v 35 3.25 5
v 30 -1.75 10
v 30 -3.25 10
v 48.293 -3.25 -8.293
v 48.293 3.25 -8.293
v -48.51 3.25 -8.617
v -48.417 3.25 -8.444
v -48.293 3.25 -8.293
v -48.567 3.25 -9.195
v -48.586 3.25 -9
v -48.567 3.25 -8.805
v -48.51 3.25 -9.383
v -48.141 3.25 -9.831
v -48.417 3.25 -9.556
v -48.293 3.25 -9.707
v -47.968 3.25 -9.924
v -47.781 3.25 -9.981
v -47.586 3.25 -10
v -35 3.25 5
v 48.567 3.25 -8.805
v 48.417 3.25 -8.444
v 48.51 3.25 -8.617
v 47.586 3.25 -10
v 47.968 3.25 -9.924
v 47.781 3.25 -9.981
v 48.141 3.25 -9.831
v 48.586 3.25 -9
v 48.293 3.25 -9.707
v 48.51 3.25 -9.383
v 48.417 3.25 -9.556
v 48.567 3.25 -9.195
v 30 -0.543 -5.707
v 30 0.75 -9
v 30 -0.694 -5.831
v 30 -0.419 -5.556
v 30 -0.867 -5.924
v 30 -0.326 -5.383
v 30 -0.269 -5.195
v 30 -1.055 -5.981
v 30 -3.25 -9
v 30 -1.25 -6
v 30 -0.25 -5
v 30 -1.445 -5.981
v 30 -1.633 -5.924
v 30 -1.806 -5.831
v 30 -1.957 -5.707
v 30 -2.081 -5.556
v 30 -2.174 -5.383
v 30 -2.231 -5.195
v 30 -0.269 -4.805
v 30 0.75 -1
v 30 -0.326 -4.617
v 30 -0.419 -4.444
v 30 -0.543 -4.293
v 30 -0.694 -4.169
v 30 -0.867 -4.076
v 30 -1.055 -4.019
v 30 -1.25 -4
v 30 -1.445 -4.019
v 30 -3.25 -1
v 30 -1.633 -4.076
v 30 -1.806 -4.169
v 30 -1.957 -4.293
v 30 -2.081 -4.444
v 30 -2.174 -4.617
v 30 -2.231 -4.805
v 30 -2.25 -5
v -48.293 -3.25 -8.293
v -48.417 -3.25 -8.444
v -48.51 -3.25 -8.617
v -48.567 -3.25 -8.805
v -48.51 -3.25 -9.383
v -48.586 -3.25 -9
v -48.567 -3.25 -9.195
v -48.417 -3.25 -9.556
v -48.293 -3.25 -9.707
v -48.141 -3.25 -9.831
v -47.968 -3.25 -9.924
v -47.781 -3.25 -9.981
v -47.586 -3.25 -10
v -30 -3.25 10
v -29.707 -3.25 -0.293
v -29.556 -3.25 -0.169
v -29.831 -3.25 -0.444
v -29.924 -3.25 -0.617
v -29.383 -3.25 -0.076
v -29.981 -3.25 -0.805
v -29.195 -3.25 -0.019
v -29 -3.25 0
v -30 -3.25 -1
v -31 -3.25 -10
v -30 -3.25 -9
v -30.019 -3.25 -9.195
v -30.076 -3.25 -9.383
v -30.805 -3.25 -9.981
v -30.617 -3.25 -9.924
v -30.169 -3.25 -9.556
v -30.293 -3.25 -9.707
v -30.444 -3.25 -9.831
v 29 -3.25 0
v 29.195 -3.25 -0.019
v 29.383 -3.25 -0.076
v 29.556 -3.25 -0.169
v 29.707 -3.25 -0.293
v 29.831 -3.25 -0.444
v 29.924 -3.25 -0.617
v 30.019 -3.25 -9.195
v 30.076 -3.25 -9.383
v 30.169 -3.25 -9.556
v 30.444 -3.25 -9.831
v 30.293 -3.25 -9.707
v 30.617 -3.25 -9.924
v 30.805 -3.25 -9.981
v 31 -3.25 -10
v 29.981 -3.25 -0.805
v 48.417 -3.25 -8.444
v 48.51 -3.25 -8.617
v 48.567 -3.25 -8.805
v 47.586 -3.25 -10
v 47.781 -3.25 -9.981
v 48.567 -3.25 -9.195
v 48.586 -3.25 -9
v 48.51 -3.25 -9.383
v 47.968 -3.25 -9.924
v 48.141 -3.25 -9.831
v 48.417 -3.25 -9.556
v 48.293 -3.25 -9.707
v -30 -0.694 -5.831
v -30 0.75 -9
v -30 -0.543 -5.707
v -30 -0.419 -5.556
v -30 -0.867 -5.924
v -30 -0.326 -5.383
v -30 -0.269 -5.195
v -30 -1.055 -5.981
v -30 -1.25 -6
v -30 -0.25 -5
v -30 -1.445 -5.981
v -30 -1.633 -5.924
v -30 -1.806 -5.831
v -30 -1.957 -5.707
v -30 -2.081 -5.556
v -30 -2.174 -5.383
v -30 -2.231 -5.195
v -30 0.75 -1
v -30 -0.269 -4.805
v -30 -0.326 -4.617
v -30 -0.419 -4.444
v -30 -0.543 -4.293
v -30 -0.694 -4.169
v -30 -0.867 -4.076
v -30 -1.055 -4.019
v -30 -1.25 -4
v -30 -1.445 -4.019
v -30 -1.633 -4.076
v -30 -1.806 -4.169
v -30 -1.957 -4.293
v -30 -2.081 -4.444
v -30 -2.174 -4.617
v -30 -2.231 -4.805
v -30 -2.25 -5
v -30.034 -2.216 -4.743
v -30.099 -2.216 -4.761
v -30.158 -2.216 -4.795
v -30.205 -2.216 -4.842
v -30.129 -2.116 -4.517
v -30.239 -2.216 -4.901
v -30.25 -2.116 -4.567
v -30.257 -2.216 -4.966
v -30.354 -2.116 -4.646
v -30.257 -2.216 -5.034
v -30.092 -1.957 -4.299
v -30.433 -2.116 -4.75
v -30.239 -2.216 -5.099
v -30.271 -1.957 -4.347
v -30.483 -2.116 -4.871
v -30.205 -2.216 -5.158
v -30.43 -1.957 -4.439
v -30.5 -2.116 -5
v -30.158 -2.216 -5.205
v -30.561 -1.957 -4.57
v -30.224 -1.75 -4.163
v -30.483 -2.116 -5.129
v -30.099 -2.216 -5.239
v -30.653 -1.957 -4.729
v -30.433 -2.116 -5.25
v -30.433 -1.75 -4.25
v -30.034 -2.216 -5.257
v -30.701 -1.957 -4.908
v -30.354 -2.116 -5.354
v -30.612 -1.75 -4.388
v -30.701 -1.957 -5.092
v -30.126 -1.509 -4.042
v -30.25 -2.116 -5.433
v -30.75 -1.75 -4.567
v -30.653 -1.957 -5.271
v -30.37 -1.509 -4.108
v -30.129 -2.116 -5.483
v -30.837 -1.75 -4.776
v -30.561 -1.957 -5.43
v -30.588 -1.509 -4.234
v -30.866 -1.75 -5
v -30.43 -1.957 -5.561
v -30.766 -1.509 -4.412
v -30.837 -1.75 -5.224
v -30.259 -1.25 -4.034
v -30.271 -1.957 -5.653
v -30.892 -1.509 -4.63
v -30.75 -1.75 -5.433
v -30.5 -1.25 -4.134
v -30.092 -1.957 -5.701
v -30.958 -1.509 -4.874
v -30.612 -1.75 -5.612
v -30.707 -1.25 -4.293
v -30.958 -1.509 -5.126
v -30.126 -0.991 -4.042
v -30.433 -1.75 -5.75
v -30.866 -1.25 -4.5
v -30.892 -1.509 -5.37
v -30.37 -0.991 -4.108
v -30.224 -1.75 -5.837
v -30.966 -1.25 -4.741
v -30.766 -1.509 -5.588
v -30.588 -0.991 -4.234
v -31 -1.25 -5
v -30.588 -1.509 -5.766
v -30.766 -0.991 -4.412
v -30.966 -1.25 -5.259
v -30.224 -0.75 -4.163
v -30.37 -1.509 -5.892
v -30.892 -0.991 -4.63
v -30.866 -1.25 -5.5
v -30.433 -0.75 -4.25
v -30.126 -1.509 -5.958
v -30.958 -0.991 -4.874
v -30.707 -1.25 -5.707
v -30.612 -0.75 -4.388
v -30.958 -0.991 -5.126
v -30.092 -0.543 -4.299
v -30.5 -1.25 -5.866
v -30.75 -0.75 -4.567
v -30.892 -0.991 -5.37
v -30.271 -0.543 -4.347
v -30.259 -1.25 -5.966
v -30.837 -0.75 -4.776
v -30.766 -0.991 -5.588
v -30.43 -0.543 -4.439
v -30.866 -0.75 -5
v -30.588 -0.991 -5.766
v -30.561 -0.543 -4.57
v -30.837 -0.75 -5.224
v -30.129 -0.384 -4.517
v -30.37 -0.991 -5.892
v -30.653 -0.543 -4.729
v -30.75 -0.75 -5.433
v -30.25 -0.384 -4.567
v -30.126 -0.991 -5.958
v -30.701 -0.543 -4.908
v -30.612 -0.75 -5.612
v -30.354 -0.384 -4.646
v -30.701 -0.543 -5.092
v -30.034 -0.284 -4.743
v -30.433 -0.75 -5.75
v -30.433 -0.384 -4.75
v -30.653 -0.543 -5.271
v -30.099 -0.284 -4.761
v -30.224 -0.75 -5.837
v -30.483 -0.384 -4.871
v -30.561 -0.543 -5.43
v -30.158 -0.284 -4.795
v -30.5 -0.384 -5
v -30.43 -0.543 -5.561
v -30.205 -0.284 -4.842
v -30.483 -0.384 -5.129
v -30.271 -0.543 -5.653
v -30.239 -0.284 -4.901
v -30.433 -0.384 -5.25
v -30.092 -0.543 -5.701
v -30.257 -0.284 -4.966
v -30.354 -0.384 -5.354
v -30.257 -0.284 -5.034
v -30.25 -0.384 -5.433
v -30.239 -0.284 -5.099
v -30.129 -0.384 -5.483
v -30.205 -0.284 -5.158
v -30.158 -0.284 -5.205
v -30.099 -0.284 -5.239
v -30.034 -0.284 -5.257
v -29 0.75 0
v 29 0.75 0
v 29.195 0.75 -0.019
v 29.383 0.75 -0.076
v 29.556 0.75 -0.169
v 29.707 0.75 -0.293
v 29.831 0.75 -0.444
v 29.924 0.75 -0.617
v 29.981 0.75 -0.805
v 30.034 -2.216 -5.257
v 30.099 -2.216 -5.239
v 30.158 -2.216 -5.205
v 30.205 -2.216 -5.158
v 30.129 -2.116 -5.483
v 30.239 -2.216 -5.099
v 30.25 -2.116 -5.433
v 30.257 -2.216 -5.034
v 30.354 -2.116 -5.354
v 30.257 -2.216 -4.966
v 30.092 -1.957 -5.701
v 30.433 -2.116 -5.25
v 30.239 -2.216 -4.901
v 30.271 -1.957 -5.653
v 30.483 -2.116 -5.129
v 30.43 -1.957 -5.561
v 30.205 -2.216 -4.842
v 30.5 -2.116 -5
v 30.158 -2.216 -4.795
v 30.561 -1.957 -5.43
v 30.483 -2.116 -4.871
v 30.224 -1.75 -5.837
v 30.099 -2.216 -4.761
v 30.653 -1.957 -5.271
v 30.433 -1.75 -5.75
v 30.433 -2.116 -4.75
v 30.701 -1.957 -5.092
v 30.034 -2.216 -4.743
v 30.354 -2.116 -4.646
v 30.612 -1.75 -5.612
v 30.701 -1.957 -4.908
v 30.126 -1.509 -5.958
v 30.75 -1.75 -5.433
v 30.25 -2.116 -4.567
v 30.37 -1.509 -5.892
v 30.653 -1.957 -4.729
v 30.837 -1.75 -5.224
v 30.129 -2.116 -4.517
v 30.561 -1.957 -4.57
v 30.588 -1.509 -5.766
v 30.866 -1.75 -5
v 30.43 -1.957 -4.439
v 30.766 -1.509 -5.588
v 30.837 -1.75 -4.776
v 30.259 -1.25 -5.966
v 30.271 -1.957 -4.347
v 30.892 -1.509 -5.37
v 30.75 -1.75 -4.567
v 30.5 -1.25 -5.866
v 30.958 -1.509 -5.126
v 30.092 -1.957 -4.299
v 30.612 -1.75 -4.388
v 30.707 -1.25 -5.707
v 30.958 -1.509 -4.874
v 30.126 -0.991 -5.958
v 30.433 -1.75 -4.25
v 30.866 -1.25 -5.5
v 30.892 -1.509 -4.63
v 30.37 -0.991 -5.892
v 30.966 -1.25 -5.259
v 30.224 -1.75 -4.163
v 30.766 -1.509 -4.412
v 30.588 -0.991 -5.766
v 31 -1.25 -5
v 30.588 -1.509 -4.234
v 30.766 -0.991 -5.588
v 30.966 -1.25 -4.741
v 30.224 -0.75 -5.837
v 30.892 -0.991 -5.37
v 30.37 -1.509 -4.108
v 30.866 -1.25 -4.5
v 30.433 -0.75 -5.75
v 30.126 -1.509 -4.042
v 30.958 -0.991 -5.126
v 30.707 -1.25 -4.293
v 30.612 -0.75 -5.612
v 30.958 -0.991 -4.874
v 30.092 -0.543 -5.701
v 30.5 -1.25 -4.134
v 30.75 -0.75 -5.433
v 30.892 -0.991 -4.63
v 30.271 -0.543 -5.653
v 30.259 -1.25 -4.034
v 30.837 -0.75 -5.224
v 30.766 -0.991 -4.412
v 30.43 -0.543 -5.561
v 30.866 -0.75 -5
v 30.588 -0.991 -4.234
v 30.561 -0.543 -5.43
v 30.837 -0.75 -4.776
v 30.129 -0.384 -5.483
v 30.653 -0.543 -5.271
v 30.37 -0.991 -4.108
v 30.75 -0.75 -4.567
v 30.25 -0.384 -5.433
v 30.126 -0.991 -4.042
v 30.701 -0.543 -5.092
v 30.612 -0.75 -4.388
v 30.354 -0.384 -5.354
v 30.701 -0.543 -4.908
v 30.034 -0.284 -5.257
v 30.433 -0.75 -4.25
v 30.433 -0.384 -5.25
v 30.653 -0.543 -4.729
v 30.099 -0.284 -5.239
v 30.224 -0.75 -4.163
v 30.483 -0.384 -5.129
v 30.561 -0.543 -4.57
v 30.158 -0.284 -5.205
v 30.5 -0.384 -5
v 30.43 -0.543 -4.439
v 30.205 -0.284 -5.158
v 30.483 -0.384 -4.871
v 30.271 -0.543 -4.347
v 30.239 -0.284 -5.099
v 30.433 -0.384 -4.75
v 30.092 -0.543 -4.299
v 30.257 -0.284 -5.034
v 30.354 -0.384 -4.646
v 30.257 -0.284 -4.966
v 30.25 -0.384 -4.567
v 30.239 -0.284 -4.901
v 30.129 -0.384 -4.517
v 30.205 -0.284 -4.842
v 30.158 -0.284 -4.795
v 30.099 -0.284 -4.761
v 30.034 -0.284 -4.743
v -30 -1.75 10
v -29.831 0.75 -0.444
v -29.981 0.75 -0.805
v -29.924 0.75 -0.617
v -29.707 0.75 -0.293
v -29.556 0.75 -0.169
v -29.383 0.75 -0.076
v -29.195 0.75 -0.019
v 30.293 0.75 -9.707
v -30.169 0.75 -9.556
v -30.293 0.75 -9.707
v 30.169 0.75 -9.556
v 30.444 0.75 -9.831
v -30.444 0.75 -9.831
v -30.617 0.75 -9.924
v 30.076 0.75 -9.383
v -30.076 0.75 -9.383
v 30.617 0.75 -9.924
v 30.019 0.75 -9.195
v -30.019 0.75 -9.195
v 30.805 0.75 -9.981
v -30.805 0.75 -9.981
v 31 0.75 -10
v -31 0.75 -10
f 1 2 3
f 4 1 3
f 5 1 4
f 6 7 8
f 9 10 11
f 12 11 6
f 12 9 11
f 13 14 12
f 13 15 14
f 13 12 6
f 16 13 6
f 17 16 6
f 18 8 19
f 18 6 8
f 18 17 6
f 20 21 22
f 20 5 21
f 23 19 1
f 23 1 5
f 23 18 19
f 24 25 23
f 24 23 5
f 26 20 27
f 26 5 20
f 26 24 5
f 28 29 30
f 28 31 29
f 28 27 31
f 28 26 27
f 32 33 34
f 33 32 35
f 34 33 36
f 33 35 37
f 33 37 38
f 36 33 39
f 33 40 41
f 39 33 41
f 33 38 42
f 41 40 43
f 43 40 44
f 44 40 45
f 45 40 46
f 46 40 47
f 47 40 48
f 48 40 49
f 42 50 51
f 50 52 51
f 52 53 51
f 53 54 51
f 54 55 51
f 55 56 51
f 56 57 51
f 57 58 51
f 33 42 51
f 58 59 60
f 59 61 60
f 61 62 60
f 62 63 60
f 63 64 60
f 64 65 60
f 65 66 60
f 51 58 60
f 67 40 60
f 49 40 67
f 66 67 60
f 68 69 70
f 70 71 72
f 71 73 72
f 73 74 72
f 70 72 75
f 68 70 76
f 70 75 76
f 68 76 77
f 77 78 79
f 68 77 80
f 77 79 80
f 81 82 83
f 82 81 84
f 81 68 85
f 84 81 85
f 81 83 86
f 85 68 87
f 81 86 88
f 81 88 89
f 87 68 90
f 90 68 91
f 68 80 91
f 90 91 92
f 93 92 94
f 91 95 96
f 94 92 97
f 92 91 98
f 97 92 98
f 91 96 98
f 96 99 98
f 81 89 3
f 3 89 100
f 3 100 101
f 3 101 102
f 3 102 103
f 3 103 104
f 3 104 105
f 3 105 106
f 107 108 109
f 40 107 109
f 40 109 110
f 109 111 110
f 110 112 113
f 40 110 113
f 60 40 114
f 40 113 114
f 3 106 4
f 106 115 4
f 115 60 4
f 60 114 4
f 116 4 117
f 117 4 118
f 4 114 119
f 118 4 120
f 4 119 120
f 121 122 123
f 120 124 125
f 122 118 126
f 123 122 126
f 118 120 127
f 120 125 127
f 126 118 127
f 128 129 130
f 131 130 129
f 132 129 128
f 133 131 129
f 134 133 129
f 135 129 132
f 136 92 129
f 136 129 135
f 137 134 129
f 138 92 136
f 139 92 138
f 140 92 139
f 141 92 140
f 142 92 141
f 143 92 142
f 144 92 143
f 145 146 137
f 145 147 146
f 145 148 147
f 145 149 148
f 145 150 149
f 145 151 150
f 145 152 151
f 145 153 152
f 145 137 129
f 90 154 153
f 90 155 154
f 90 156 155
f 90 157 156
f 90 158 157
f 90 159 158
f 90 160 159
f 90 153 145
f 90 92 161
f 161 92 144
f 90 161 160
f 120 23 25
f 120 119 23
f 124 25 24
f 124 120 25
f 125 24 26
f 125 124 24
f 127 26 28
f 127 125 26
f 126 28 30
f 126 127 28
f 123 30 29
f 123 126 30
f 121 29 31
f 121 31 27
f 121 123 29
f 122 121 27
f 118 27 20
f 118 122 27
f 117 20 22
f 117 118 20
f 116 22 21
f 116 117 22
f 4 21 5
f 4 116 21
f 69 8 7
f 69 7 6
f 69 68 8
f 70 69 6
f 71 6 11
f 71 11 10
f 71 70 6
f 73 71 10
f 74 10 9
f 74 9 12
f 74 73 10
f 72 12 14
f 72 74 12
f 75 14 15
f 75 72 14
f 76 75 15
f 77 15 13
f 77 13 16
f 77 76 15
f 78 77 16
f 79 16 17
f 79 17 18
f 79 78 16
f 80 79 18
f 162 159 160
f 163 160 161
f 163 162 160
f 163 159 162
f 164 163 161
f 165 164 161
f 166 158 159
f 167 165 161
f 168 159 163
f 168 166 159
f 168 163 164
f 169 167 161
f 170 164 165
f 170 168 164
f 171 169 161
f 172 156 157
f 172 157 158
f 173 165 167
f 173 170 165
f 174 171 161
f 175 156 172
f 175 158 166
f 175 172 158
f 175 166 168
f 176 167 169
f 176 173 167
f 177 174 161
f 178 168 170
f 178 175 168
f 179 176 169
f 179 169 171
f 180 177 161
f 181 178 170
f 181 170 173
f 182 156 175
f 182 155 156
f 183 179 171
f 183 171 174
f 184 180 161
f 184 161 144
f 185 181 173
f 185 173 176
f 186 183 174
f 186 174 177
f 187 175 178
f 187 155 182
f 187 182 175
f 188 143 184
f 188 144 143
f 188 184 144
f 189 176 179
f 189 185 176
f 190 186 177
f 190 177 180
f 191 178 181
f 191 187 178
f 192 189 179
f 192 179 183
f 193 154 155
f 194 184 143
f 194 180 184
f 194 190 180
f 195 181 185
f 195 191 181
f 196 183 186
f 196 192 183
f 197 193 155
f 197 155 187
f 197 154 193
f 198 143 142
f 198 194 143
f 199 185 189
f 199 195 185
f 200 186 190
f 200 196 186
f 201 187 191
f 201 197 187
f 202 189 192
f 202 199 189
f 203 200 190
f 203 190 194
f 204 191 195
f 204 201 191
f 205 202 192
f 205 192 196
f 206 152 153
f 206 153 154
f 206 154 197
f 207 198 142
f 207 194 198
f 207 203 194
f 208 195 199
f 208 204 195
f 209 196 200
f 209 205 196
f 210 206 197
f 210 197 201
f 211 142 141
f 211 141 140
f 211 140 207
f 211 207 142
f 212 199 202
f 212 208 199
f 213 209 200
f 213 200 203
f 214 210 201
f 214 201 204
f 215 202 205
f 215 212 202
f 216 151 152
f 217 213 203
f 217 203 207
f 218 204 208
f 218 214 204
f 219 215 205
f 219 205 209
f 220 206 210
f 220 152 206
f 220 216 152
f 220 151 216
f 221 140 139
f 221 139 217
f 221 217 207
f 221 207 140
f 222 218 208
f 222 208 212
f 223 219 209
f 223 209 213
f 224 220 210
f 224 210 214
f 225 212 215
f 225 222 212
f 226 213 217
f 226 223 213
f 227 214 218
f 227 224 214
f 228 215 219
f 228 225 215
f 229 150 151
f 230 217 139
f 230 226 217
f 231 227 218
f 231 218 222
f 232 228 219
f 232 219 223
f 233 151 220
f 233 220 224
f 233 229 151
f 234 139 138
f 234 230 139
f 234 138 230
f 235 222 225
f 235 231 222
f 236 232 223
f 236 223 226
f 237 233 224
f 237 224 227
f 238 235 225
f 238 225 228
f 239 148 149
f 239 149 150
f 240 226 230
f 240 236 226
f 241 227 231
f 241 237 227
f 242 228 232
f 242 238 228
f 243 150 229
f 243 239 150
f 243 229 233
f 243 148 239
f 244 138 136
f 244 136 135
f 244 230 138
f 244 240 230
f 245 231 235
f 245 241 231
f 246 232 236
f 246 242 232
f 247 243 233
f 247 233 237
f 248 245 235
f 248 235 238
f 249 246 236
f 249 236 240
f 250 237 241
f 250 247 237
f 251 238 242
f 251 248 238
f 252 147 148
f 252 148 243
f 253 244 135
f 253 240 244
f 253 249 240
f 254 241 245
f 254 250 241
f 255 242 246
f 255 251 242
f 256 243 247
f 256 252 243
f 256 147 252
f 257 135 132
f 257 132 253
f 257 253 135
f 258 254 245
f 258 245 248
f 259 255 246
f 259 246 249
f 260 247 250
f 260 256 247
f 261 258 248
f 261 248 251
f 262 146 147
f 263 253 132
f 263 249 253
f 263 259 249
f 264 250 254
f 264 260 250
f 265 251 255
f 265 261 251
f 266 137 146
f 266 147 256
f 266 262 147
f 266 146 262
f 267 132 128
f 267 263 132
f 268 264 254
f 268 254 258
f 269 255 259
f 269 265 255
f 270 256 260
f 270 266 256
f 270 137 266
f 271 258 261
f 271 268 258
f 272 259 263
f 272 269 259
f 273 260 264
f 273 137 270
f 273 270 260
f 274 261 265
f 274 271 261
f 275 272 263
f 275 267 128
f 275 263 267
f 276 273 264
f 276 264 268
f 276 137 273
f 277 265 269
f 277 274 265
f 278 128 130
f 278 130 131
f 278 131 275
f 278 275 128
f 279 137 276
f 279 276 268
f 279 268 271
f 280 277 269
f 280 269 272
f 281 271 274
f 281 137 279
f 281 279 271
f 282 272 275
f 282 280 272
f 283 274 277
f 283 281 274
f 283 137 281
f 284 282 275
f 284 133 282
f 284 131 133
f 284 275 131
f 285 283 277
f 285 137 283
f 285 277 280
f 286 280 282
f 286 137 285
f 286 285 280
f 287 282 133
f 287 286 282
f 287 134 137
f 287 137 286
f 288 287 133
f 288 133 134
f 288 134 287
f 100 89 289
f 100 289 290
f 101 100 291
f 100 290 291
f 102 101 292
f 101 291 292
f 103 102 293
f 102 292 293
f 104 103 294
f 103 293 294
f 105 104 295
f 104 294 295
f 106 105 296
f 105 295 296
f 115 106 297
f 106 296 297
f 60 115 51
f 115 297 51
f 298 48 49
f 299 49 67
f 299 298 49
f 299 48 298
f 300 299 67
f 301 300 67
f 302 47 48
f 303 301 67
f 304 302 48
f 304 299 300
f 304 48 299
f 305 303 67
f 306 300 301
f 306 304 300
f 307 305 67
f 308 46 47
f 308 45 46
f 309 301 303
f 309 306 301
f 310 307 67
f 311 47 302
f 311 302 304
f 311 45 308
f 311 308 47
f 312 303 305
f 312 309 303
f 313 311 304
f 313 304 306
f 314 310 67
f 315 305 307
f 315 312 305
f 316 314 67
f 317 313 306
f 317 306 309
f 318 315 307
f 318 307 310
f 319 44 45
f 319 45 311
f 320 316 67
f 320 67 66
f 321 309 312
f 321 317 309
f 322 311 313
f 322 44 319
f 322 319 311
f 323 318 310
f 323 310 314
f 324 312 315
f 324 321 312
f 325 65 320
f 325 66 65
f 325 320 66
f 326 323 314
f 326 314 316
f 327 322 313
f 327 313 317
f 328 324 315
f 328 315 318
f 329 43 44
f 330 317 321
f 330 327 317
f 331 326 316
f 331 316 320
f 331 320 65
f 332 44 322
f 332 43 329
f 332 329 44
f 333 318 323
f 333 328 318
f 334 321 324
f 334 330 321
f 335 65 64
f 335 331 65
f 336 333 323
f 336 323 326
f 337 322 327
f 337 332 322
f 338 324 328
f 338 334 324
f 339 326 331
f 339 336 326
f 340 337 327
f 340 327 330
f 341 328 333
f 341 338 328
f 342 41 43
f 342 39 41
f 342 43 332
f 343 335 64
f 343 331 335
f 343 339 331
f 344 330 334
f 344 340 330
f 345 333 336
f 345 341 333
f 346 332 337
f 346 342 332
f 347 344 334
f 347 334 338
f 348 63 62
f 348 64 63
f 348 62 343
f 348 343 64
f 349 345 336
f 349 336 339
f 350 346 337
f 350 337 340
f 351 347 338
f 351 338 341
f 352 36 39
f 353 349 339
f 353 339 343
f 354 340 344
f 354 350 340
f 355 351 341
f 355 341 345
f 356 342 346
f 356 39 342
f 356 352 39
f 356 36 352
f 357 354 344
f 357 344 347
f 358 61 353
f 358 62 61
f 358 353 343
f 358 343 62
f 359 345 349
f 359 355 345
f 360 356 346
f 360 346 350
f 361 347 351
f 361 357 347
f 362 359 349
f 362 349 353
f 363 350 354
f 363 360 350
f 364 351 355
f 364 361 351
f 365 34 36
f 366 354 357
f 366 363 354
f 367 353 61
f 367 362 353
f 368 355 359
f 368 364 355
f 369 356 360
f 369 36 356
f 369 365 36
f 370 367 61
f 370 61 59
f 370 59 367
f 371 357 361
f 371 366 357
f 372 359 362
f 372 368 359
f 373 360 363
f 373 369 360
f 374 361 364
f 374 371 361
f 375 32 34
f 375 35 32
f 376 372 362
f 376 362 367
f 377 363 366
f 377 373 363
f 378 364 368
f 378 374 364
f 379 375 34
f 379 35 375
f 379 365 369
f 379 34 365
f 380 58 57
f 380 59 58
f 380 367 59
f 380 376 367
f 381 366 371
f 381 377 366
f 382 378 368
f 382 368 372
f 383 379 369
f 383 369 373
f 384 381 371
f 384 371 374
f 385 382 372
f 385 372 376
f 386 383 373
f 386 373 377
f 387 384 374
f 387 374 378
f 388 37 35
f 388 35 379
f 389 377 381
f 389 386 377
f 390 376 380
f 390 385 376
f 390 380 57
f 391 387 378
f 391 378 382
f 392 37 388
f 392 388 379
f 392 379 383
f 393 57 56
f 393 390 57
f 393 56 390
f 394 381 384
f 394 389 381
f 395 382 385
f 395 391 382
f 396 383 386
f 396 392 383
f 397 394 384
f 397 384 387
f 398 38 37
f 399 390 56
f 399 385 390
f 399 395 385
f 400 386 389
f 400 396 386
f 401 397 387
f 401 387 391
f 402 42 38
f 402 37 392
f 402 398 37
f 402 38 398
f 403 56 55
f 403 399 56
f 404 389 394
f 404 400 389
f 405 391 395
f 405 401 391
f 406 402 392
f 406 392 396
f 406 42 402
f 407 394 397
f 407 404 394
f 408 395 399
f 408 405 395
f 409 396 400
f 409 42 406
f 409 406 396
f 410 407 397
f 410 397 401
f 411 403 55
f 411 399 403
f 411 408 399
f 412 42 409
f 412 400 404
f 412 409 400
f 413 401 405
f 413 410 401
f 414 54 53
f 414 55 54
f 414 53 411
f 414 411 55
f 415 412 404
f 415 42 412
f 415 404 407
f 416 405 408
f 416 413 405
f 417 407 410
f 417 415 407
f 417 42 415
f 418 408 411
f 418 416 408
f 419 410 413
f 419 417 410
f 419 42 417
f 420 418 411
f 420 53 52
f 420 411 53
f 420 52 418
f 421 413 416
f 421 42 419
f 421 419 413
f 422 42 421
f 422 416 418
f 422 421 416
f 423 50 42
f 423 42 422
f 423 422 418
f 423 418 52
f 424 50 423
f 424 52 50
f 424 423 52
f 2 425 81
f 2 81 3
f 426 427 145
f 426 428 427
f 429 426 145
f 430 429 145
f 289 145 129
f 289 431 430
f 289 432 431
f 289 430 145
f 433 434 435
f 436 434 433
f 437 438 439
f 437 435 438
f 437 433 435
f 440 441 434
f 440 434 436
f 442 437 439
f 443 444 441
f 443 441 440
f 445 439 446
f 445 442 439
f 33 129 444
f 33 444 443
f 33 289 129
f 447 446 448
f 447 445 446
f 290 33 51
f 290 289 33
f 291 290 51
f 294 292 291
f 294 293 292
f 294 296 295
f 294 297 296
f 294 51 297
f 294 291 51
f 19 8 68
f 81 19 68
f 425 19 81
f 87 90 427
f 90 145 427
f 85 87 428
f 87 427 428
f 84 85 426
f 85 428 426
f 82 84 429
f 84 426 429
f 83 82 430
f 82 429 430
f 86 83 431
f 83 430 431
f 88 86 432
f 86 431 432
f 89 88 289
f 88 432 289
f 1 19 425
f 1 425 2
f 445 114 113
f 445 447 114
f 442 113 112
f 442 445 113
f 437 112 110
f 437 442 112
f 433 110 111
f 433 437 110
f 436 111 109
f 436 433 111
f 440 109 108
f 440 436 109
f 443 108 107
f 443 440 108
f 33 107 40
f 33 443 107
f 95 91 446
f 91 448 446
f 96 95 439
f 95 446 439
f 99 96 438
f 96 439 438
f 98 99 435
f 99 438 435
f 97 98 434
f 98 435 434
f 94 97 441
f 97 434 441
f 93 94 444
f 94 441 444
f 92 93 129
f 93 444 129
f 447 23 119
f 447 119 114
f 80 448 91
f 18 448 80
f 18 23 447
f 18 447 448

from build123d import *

# Parameters (mm, degrees)
BOSS_EXTRUDE1_DEPTH = 3.25
SKETCH2_W           = 60
SKETCH2_H           = 10
CUT_EXTRUDE1_DEPTH  = 4
CHAMFER1_SIZE       = 5
FILLET1_R           = 1


with BuildPart() as part:
    # Sketch1 → Boss-Extrude1 (new, symmetric)
    with BuildSketch(Plane(origin=(0, 0, 0), x_dir=(1, 0, 0), z_dir=(0, 1, 0))):
        Polygon((-50, 10), (-30, -10), (30, -10), (50, 10), align=None)
    extrude(amount=BOSS_EXTRUDE1_DEPTH, both=True)

    # Sketch2 → Cut-Extrude1 (cut)
    with BuildSketch(Plane.XZ.offset(3.25)):
        with Locations((0, -5)):
            Rectangle(SKETCH2_W, SKETCH2_H)
    extrude(amount=-CUT_EXTRUDE1_DEPTH, mode=Mode.SUBTRACT)

    # Sketch3 → Cut-Revolve1 (revolve, cut)
    with BuildSketch(Plane(origin=(-30, 0, 0), x_dir=(0, 0, -1), z_dir=(1, 0, 0))):
        with BuildLine():
            Line((5, -0.25), (5, -2.25))
            ThreePointArc((5, -2.25), (6, -1.25), (5, -0.25))
        make_face()
    revolve(axis=Axis((-30, -0.25, -5), (0, -1, 0)), mode=Mode.SUBTRACT)

    # Sketch4 → Cut-Revolve2 (revolve, cut)
    with BuildSketch(Plane.ZY.offset(-30)):
        with BuildLine():
            Line((-5, -0.25), (-5, -2.25))
            ThreePointArc((-5, -2.25), (-6, -1.25), (-5, -0.25))
        make_face()
    revolve(axis=Axis((30, 0.75, -5), (0, -1, 0)), mode=Mode.SUBTRACT)

    # Chamfer1
    chamfer1_edges = [part.edges().sort_by_distance(p)[0] for p in [
        (0, 3.25, 10),
    ]]
    chamfer(chamfer1_edges, length=CHAMFER1_SIZE)

    # Fillet1
    fillet1_edges = [part.edges().sort_by_distance(p)[0] for p in [
        (-30, -1.25, -10),
        (-30, -1.25, 0),
        (30, -1.25, 0),
        (30, -1.25, -10),
        (-50, 0, -10),
        (50, 0, -10),
    ]]
    fillet(fillet1_edges, radius=FILLET1_R)


solid = part.part
